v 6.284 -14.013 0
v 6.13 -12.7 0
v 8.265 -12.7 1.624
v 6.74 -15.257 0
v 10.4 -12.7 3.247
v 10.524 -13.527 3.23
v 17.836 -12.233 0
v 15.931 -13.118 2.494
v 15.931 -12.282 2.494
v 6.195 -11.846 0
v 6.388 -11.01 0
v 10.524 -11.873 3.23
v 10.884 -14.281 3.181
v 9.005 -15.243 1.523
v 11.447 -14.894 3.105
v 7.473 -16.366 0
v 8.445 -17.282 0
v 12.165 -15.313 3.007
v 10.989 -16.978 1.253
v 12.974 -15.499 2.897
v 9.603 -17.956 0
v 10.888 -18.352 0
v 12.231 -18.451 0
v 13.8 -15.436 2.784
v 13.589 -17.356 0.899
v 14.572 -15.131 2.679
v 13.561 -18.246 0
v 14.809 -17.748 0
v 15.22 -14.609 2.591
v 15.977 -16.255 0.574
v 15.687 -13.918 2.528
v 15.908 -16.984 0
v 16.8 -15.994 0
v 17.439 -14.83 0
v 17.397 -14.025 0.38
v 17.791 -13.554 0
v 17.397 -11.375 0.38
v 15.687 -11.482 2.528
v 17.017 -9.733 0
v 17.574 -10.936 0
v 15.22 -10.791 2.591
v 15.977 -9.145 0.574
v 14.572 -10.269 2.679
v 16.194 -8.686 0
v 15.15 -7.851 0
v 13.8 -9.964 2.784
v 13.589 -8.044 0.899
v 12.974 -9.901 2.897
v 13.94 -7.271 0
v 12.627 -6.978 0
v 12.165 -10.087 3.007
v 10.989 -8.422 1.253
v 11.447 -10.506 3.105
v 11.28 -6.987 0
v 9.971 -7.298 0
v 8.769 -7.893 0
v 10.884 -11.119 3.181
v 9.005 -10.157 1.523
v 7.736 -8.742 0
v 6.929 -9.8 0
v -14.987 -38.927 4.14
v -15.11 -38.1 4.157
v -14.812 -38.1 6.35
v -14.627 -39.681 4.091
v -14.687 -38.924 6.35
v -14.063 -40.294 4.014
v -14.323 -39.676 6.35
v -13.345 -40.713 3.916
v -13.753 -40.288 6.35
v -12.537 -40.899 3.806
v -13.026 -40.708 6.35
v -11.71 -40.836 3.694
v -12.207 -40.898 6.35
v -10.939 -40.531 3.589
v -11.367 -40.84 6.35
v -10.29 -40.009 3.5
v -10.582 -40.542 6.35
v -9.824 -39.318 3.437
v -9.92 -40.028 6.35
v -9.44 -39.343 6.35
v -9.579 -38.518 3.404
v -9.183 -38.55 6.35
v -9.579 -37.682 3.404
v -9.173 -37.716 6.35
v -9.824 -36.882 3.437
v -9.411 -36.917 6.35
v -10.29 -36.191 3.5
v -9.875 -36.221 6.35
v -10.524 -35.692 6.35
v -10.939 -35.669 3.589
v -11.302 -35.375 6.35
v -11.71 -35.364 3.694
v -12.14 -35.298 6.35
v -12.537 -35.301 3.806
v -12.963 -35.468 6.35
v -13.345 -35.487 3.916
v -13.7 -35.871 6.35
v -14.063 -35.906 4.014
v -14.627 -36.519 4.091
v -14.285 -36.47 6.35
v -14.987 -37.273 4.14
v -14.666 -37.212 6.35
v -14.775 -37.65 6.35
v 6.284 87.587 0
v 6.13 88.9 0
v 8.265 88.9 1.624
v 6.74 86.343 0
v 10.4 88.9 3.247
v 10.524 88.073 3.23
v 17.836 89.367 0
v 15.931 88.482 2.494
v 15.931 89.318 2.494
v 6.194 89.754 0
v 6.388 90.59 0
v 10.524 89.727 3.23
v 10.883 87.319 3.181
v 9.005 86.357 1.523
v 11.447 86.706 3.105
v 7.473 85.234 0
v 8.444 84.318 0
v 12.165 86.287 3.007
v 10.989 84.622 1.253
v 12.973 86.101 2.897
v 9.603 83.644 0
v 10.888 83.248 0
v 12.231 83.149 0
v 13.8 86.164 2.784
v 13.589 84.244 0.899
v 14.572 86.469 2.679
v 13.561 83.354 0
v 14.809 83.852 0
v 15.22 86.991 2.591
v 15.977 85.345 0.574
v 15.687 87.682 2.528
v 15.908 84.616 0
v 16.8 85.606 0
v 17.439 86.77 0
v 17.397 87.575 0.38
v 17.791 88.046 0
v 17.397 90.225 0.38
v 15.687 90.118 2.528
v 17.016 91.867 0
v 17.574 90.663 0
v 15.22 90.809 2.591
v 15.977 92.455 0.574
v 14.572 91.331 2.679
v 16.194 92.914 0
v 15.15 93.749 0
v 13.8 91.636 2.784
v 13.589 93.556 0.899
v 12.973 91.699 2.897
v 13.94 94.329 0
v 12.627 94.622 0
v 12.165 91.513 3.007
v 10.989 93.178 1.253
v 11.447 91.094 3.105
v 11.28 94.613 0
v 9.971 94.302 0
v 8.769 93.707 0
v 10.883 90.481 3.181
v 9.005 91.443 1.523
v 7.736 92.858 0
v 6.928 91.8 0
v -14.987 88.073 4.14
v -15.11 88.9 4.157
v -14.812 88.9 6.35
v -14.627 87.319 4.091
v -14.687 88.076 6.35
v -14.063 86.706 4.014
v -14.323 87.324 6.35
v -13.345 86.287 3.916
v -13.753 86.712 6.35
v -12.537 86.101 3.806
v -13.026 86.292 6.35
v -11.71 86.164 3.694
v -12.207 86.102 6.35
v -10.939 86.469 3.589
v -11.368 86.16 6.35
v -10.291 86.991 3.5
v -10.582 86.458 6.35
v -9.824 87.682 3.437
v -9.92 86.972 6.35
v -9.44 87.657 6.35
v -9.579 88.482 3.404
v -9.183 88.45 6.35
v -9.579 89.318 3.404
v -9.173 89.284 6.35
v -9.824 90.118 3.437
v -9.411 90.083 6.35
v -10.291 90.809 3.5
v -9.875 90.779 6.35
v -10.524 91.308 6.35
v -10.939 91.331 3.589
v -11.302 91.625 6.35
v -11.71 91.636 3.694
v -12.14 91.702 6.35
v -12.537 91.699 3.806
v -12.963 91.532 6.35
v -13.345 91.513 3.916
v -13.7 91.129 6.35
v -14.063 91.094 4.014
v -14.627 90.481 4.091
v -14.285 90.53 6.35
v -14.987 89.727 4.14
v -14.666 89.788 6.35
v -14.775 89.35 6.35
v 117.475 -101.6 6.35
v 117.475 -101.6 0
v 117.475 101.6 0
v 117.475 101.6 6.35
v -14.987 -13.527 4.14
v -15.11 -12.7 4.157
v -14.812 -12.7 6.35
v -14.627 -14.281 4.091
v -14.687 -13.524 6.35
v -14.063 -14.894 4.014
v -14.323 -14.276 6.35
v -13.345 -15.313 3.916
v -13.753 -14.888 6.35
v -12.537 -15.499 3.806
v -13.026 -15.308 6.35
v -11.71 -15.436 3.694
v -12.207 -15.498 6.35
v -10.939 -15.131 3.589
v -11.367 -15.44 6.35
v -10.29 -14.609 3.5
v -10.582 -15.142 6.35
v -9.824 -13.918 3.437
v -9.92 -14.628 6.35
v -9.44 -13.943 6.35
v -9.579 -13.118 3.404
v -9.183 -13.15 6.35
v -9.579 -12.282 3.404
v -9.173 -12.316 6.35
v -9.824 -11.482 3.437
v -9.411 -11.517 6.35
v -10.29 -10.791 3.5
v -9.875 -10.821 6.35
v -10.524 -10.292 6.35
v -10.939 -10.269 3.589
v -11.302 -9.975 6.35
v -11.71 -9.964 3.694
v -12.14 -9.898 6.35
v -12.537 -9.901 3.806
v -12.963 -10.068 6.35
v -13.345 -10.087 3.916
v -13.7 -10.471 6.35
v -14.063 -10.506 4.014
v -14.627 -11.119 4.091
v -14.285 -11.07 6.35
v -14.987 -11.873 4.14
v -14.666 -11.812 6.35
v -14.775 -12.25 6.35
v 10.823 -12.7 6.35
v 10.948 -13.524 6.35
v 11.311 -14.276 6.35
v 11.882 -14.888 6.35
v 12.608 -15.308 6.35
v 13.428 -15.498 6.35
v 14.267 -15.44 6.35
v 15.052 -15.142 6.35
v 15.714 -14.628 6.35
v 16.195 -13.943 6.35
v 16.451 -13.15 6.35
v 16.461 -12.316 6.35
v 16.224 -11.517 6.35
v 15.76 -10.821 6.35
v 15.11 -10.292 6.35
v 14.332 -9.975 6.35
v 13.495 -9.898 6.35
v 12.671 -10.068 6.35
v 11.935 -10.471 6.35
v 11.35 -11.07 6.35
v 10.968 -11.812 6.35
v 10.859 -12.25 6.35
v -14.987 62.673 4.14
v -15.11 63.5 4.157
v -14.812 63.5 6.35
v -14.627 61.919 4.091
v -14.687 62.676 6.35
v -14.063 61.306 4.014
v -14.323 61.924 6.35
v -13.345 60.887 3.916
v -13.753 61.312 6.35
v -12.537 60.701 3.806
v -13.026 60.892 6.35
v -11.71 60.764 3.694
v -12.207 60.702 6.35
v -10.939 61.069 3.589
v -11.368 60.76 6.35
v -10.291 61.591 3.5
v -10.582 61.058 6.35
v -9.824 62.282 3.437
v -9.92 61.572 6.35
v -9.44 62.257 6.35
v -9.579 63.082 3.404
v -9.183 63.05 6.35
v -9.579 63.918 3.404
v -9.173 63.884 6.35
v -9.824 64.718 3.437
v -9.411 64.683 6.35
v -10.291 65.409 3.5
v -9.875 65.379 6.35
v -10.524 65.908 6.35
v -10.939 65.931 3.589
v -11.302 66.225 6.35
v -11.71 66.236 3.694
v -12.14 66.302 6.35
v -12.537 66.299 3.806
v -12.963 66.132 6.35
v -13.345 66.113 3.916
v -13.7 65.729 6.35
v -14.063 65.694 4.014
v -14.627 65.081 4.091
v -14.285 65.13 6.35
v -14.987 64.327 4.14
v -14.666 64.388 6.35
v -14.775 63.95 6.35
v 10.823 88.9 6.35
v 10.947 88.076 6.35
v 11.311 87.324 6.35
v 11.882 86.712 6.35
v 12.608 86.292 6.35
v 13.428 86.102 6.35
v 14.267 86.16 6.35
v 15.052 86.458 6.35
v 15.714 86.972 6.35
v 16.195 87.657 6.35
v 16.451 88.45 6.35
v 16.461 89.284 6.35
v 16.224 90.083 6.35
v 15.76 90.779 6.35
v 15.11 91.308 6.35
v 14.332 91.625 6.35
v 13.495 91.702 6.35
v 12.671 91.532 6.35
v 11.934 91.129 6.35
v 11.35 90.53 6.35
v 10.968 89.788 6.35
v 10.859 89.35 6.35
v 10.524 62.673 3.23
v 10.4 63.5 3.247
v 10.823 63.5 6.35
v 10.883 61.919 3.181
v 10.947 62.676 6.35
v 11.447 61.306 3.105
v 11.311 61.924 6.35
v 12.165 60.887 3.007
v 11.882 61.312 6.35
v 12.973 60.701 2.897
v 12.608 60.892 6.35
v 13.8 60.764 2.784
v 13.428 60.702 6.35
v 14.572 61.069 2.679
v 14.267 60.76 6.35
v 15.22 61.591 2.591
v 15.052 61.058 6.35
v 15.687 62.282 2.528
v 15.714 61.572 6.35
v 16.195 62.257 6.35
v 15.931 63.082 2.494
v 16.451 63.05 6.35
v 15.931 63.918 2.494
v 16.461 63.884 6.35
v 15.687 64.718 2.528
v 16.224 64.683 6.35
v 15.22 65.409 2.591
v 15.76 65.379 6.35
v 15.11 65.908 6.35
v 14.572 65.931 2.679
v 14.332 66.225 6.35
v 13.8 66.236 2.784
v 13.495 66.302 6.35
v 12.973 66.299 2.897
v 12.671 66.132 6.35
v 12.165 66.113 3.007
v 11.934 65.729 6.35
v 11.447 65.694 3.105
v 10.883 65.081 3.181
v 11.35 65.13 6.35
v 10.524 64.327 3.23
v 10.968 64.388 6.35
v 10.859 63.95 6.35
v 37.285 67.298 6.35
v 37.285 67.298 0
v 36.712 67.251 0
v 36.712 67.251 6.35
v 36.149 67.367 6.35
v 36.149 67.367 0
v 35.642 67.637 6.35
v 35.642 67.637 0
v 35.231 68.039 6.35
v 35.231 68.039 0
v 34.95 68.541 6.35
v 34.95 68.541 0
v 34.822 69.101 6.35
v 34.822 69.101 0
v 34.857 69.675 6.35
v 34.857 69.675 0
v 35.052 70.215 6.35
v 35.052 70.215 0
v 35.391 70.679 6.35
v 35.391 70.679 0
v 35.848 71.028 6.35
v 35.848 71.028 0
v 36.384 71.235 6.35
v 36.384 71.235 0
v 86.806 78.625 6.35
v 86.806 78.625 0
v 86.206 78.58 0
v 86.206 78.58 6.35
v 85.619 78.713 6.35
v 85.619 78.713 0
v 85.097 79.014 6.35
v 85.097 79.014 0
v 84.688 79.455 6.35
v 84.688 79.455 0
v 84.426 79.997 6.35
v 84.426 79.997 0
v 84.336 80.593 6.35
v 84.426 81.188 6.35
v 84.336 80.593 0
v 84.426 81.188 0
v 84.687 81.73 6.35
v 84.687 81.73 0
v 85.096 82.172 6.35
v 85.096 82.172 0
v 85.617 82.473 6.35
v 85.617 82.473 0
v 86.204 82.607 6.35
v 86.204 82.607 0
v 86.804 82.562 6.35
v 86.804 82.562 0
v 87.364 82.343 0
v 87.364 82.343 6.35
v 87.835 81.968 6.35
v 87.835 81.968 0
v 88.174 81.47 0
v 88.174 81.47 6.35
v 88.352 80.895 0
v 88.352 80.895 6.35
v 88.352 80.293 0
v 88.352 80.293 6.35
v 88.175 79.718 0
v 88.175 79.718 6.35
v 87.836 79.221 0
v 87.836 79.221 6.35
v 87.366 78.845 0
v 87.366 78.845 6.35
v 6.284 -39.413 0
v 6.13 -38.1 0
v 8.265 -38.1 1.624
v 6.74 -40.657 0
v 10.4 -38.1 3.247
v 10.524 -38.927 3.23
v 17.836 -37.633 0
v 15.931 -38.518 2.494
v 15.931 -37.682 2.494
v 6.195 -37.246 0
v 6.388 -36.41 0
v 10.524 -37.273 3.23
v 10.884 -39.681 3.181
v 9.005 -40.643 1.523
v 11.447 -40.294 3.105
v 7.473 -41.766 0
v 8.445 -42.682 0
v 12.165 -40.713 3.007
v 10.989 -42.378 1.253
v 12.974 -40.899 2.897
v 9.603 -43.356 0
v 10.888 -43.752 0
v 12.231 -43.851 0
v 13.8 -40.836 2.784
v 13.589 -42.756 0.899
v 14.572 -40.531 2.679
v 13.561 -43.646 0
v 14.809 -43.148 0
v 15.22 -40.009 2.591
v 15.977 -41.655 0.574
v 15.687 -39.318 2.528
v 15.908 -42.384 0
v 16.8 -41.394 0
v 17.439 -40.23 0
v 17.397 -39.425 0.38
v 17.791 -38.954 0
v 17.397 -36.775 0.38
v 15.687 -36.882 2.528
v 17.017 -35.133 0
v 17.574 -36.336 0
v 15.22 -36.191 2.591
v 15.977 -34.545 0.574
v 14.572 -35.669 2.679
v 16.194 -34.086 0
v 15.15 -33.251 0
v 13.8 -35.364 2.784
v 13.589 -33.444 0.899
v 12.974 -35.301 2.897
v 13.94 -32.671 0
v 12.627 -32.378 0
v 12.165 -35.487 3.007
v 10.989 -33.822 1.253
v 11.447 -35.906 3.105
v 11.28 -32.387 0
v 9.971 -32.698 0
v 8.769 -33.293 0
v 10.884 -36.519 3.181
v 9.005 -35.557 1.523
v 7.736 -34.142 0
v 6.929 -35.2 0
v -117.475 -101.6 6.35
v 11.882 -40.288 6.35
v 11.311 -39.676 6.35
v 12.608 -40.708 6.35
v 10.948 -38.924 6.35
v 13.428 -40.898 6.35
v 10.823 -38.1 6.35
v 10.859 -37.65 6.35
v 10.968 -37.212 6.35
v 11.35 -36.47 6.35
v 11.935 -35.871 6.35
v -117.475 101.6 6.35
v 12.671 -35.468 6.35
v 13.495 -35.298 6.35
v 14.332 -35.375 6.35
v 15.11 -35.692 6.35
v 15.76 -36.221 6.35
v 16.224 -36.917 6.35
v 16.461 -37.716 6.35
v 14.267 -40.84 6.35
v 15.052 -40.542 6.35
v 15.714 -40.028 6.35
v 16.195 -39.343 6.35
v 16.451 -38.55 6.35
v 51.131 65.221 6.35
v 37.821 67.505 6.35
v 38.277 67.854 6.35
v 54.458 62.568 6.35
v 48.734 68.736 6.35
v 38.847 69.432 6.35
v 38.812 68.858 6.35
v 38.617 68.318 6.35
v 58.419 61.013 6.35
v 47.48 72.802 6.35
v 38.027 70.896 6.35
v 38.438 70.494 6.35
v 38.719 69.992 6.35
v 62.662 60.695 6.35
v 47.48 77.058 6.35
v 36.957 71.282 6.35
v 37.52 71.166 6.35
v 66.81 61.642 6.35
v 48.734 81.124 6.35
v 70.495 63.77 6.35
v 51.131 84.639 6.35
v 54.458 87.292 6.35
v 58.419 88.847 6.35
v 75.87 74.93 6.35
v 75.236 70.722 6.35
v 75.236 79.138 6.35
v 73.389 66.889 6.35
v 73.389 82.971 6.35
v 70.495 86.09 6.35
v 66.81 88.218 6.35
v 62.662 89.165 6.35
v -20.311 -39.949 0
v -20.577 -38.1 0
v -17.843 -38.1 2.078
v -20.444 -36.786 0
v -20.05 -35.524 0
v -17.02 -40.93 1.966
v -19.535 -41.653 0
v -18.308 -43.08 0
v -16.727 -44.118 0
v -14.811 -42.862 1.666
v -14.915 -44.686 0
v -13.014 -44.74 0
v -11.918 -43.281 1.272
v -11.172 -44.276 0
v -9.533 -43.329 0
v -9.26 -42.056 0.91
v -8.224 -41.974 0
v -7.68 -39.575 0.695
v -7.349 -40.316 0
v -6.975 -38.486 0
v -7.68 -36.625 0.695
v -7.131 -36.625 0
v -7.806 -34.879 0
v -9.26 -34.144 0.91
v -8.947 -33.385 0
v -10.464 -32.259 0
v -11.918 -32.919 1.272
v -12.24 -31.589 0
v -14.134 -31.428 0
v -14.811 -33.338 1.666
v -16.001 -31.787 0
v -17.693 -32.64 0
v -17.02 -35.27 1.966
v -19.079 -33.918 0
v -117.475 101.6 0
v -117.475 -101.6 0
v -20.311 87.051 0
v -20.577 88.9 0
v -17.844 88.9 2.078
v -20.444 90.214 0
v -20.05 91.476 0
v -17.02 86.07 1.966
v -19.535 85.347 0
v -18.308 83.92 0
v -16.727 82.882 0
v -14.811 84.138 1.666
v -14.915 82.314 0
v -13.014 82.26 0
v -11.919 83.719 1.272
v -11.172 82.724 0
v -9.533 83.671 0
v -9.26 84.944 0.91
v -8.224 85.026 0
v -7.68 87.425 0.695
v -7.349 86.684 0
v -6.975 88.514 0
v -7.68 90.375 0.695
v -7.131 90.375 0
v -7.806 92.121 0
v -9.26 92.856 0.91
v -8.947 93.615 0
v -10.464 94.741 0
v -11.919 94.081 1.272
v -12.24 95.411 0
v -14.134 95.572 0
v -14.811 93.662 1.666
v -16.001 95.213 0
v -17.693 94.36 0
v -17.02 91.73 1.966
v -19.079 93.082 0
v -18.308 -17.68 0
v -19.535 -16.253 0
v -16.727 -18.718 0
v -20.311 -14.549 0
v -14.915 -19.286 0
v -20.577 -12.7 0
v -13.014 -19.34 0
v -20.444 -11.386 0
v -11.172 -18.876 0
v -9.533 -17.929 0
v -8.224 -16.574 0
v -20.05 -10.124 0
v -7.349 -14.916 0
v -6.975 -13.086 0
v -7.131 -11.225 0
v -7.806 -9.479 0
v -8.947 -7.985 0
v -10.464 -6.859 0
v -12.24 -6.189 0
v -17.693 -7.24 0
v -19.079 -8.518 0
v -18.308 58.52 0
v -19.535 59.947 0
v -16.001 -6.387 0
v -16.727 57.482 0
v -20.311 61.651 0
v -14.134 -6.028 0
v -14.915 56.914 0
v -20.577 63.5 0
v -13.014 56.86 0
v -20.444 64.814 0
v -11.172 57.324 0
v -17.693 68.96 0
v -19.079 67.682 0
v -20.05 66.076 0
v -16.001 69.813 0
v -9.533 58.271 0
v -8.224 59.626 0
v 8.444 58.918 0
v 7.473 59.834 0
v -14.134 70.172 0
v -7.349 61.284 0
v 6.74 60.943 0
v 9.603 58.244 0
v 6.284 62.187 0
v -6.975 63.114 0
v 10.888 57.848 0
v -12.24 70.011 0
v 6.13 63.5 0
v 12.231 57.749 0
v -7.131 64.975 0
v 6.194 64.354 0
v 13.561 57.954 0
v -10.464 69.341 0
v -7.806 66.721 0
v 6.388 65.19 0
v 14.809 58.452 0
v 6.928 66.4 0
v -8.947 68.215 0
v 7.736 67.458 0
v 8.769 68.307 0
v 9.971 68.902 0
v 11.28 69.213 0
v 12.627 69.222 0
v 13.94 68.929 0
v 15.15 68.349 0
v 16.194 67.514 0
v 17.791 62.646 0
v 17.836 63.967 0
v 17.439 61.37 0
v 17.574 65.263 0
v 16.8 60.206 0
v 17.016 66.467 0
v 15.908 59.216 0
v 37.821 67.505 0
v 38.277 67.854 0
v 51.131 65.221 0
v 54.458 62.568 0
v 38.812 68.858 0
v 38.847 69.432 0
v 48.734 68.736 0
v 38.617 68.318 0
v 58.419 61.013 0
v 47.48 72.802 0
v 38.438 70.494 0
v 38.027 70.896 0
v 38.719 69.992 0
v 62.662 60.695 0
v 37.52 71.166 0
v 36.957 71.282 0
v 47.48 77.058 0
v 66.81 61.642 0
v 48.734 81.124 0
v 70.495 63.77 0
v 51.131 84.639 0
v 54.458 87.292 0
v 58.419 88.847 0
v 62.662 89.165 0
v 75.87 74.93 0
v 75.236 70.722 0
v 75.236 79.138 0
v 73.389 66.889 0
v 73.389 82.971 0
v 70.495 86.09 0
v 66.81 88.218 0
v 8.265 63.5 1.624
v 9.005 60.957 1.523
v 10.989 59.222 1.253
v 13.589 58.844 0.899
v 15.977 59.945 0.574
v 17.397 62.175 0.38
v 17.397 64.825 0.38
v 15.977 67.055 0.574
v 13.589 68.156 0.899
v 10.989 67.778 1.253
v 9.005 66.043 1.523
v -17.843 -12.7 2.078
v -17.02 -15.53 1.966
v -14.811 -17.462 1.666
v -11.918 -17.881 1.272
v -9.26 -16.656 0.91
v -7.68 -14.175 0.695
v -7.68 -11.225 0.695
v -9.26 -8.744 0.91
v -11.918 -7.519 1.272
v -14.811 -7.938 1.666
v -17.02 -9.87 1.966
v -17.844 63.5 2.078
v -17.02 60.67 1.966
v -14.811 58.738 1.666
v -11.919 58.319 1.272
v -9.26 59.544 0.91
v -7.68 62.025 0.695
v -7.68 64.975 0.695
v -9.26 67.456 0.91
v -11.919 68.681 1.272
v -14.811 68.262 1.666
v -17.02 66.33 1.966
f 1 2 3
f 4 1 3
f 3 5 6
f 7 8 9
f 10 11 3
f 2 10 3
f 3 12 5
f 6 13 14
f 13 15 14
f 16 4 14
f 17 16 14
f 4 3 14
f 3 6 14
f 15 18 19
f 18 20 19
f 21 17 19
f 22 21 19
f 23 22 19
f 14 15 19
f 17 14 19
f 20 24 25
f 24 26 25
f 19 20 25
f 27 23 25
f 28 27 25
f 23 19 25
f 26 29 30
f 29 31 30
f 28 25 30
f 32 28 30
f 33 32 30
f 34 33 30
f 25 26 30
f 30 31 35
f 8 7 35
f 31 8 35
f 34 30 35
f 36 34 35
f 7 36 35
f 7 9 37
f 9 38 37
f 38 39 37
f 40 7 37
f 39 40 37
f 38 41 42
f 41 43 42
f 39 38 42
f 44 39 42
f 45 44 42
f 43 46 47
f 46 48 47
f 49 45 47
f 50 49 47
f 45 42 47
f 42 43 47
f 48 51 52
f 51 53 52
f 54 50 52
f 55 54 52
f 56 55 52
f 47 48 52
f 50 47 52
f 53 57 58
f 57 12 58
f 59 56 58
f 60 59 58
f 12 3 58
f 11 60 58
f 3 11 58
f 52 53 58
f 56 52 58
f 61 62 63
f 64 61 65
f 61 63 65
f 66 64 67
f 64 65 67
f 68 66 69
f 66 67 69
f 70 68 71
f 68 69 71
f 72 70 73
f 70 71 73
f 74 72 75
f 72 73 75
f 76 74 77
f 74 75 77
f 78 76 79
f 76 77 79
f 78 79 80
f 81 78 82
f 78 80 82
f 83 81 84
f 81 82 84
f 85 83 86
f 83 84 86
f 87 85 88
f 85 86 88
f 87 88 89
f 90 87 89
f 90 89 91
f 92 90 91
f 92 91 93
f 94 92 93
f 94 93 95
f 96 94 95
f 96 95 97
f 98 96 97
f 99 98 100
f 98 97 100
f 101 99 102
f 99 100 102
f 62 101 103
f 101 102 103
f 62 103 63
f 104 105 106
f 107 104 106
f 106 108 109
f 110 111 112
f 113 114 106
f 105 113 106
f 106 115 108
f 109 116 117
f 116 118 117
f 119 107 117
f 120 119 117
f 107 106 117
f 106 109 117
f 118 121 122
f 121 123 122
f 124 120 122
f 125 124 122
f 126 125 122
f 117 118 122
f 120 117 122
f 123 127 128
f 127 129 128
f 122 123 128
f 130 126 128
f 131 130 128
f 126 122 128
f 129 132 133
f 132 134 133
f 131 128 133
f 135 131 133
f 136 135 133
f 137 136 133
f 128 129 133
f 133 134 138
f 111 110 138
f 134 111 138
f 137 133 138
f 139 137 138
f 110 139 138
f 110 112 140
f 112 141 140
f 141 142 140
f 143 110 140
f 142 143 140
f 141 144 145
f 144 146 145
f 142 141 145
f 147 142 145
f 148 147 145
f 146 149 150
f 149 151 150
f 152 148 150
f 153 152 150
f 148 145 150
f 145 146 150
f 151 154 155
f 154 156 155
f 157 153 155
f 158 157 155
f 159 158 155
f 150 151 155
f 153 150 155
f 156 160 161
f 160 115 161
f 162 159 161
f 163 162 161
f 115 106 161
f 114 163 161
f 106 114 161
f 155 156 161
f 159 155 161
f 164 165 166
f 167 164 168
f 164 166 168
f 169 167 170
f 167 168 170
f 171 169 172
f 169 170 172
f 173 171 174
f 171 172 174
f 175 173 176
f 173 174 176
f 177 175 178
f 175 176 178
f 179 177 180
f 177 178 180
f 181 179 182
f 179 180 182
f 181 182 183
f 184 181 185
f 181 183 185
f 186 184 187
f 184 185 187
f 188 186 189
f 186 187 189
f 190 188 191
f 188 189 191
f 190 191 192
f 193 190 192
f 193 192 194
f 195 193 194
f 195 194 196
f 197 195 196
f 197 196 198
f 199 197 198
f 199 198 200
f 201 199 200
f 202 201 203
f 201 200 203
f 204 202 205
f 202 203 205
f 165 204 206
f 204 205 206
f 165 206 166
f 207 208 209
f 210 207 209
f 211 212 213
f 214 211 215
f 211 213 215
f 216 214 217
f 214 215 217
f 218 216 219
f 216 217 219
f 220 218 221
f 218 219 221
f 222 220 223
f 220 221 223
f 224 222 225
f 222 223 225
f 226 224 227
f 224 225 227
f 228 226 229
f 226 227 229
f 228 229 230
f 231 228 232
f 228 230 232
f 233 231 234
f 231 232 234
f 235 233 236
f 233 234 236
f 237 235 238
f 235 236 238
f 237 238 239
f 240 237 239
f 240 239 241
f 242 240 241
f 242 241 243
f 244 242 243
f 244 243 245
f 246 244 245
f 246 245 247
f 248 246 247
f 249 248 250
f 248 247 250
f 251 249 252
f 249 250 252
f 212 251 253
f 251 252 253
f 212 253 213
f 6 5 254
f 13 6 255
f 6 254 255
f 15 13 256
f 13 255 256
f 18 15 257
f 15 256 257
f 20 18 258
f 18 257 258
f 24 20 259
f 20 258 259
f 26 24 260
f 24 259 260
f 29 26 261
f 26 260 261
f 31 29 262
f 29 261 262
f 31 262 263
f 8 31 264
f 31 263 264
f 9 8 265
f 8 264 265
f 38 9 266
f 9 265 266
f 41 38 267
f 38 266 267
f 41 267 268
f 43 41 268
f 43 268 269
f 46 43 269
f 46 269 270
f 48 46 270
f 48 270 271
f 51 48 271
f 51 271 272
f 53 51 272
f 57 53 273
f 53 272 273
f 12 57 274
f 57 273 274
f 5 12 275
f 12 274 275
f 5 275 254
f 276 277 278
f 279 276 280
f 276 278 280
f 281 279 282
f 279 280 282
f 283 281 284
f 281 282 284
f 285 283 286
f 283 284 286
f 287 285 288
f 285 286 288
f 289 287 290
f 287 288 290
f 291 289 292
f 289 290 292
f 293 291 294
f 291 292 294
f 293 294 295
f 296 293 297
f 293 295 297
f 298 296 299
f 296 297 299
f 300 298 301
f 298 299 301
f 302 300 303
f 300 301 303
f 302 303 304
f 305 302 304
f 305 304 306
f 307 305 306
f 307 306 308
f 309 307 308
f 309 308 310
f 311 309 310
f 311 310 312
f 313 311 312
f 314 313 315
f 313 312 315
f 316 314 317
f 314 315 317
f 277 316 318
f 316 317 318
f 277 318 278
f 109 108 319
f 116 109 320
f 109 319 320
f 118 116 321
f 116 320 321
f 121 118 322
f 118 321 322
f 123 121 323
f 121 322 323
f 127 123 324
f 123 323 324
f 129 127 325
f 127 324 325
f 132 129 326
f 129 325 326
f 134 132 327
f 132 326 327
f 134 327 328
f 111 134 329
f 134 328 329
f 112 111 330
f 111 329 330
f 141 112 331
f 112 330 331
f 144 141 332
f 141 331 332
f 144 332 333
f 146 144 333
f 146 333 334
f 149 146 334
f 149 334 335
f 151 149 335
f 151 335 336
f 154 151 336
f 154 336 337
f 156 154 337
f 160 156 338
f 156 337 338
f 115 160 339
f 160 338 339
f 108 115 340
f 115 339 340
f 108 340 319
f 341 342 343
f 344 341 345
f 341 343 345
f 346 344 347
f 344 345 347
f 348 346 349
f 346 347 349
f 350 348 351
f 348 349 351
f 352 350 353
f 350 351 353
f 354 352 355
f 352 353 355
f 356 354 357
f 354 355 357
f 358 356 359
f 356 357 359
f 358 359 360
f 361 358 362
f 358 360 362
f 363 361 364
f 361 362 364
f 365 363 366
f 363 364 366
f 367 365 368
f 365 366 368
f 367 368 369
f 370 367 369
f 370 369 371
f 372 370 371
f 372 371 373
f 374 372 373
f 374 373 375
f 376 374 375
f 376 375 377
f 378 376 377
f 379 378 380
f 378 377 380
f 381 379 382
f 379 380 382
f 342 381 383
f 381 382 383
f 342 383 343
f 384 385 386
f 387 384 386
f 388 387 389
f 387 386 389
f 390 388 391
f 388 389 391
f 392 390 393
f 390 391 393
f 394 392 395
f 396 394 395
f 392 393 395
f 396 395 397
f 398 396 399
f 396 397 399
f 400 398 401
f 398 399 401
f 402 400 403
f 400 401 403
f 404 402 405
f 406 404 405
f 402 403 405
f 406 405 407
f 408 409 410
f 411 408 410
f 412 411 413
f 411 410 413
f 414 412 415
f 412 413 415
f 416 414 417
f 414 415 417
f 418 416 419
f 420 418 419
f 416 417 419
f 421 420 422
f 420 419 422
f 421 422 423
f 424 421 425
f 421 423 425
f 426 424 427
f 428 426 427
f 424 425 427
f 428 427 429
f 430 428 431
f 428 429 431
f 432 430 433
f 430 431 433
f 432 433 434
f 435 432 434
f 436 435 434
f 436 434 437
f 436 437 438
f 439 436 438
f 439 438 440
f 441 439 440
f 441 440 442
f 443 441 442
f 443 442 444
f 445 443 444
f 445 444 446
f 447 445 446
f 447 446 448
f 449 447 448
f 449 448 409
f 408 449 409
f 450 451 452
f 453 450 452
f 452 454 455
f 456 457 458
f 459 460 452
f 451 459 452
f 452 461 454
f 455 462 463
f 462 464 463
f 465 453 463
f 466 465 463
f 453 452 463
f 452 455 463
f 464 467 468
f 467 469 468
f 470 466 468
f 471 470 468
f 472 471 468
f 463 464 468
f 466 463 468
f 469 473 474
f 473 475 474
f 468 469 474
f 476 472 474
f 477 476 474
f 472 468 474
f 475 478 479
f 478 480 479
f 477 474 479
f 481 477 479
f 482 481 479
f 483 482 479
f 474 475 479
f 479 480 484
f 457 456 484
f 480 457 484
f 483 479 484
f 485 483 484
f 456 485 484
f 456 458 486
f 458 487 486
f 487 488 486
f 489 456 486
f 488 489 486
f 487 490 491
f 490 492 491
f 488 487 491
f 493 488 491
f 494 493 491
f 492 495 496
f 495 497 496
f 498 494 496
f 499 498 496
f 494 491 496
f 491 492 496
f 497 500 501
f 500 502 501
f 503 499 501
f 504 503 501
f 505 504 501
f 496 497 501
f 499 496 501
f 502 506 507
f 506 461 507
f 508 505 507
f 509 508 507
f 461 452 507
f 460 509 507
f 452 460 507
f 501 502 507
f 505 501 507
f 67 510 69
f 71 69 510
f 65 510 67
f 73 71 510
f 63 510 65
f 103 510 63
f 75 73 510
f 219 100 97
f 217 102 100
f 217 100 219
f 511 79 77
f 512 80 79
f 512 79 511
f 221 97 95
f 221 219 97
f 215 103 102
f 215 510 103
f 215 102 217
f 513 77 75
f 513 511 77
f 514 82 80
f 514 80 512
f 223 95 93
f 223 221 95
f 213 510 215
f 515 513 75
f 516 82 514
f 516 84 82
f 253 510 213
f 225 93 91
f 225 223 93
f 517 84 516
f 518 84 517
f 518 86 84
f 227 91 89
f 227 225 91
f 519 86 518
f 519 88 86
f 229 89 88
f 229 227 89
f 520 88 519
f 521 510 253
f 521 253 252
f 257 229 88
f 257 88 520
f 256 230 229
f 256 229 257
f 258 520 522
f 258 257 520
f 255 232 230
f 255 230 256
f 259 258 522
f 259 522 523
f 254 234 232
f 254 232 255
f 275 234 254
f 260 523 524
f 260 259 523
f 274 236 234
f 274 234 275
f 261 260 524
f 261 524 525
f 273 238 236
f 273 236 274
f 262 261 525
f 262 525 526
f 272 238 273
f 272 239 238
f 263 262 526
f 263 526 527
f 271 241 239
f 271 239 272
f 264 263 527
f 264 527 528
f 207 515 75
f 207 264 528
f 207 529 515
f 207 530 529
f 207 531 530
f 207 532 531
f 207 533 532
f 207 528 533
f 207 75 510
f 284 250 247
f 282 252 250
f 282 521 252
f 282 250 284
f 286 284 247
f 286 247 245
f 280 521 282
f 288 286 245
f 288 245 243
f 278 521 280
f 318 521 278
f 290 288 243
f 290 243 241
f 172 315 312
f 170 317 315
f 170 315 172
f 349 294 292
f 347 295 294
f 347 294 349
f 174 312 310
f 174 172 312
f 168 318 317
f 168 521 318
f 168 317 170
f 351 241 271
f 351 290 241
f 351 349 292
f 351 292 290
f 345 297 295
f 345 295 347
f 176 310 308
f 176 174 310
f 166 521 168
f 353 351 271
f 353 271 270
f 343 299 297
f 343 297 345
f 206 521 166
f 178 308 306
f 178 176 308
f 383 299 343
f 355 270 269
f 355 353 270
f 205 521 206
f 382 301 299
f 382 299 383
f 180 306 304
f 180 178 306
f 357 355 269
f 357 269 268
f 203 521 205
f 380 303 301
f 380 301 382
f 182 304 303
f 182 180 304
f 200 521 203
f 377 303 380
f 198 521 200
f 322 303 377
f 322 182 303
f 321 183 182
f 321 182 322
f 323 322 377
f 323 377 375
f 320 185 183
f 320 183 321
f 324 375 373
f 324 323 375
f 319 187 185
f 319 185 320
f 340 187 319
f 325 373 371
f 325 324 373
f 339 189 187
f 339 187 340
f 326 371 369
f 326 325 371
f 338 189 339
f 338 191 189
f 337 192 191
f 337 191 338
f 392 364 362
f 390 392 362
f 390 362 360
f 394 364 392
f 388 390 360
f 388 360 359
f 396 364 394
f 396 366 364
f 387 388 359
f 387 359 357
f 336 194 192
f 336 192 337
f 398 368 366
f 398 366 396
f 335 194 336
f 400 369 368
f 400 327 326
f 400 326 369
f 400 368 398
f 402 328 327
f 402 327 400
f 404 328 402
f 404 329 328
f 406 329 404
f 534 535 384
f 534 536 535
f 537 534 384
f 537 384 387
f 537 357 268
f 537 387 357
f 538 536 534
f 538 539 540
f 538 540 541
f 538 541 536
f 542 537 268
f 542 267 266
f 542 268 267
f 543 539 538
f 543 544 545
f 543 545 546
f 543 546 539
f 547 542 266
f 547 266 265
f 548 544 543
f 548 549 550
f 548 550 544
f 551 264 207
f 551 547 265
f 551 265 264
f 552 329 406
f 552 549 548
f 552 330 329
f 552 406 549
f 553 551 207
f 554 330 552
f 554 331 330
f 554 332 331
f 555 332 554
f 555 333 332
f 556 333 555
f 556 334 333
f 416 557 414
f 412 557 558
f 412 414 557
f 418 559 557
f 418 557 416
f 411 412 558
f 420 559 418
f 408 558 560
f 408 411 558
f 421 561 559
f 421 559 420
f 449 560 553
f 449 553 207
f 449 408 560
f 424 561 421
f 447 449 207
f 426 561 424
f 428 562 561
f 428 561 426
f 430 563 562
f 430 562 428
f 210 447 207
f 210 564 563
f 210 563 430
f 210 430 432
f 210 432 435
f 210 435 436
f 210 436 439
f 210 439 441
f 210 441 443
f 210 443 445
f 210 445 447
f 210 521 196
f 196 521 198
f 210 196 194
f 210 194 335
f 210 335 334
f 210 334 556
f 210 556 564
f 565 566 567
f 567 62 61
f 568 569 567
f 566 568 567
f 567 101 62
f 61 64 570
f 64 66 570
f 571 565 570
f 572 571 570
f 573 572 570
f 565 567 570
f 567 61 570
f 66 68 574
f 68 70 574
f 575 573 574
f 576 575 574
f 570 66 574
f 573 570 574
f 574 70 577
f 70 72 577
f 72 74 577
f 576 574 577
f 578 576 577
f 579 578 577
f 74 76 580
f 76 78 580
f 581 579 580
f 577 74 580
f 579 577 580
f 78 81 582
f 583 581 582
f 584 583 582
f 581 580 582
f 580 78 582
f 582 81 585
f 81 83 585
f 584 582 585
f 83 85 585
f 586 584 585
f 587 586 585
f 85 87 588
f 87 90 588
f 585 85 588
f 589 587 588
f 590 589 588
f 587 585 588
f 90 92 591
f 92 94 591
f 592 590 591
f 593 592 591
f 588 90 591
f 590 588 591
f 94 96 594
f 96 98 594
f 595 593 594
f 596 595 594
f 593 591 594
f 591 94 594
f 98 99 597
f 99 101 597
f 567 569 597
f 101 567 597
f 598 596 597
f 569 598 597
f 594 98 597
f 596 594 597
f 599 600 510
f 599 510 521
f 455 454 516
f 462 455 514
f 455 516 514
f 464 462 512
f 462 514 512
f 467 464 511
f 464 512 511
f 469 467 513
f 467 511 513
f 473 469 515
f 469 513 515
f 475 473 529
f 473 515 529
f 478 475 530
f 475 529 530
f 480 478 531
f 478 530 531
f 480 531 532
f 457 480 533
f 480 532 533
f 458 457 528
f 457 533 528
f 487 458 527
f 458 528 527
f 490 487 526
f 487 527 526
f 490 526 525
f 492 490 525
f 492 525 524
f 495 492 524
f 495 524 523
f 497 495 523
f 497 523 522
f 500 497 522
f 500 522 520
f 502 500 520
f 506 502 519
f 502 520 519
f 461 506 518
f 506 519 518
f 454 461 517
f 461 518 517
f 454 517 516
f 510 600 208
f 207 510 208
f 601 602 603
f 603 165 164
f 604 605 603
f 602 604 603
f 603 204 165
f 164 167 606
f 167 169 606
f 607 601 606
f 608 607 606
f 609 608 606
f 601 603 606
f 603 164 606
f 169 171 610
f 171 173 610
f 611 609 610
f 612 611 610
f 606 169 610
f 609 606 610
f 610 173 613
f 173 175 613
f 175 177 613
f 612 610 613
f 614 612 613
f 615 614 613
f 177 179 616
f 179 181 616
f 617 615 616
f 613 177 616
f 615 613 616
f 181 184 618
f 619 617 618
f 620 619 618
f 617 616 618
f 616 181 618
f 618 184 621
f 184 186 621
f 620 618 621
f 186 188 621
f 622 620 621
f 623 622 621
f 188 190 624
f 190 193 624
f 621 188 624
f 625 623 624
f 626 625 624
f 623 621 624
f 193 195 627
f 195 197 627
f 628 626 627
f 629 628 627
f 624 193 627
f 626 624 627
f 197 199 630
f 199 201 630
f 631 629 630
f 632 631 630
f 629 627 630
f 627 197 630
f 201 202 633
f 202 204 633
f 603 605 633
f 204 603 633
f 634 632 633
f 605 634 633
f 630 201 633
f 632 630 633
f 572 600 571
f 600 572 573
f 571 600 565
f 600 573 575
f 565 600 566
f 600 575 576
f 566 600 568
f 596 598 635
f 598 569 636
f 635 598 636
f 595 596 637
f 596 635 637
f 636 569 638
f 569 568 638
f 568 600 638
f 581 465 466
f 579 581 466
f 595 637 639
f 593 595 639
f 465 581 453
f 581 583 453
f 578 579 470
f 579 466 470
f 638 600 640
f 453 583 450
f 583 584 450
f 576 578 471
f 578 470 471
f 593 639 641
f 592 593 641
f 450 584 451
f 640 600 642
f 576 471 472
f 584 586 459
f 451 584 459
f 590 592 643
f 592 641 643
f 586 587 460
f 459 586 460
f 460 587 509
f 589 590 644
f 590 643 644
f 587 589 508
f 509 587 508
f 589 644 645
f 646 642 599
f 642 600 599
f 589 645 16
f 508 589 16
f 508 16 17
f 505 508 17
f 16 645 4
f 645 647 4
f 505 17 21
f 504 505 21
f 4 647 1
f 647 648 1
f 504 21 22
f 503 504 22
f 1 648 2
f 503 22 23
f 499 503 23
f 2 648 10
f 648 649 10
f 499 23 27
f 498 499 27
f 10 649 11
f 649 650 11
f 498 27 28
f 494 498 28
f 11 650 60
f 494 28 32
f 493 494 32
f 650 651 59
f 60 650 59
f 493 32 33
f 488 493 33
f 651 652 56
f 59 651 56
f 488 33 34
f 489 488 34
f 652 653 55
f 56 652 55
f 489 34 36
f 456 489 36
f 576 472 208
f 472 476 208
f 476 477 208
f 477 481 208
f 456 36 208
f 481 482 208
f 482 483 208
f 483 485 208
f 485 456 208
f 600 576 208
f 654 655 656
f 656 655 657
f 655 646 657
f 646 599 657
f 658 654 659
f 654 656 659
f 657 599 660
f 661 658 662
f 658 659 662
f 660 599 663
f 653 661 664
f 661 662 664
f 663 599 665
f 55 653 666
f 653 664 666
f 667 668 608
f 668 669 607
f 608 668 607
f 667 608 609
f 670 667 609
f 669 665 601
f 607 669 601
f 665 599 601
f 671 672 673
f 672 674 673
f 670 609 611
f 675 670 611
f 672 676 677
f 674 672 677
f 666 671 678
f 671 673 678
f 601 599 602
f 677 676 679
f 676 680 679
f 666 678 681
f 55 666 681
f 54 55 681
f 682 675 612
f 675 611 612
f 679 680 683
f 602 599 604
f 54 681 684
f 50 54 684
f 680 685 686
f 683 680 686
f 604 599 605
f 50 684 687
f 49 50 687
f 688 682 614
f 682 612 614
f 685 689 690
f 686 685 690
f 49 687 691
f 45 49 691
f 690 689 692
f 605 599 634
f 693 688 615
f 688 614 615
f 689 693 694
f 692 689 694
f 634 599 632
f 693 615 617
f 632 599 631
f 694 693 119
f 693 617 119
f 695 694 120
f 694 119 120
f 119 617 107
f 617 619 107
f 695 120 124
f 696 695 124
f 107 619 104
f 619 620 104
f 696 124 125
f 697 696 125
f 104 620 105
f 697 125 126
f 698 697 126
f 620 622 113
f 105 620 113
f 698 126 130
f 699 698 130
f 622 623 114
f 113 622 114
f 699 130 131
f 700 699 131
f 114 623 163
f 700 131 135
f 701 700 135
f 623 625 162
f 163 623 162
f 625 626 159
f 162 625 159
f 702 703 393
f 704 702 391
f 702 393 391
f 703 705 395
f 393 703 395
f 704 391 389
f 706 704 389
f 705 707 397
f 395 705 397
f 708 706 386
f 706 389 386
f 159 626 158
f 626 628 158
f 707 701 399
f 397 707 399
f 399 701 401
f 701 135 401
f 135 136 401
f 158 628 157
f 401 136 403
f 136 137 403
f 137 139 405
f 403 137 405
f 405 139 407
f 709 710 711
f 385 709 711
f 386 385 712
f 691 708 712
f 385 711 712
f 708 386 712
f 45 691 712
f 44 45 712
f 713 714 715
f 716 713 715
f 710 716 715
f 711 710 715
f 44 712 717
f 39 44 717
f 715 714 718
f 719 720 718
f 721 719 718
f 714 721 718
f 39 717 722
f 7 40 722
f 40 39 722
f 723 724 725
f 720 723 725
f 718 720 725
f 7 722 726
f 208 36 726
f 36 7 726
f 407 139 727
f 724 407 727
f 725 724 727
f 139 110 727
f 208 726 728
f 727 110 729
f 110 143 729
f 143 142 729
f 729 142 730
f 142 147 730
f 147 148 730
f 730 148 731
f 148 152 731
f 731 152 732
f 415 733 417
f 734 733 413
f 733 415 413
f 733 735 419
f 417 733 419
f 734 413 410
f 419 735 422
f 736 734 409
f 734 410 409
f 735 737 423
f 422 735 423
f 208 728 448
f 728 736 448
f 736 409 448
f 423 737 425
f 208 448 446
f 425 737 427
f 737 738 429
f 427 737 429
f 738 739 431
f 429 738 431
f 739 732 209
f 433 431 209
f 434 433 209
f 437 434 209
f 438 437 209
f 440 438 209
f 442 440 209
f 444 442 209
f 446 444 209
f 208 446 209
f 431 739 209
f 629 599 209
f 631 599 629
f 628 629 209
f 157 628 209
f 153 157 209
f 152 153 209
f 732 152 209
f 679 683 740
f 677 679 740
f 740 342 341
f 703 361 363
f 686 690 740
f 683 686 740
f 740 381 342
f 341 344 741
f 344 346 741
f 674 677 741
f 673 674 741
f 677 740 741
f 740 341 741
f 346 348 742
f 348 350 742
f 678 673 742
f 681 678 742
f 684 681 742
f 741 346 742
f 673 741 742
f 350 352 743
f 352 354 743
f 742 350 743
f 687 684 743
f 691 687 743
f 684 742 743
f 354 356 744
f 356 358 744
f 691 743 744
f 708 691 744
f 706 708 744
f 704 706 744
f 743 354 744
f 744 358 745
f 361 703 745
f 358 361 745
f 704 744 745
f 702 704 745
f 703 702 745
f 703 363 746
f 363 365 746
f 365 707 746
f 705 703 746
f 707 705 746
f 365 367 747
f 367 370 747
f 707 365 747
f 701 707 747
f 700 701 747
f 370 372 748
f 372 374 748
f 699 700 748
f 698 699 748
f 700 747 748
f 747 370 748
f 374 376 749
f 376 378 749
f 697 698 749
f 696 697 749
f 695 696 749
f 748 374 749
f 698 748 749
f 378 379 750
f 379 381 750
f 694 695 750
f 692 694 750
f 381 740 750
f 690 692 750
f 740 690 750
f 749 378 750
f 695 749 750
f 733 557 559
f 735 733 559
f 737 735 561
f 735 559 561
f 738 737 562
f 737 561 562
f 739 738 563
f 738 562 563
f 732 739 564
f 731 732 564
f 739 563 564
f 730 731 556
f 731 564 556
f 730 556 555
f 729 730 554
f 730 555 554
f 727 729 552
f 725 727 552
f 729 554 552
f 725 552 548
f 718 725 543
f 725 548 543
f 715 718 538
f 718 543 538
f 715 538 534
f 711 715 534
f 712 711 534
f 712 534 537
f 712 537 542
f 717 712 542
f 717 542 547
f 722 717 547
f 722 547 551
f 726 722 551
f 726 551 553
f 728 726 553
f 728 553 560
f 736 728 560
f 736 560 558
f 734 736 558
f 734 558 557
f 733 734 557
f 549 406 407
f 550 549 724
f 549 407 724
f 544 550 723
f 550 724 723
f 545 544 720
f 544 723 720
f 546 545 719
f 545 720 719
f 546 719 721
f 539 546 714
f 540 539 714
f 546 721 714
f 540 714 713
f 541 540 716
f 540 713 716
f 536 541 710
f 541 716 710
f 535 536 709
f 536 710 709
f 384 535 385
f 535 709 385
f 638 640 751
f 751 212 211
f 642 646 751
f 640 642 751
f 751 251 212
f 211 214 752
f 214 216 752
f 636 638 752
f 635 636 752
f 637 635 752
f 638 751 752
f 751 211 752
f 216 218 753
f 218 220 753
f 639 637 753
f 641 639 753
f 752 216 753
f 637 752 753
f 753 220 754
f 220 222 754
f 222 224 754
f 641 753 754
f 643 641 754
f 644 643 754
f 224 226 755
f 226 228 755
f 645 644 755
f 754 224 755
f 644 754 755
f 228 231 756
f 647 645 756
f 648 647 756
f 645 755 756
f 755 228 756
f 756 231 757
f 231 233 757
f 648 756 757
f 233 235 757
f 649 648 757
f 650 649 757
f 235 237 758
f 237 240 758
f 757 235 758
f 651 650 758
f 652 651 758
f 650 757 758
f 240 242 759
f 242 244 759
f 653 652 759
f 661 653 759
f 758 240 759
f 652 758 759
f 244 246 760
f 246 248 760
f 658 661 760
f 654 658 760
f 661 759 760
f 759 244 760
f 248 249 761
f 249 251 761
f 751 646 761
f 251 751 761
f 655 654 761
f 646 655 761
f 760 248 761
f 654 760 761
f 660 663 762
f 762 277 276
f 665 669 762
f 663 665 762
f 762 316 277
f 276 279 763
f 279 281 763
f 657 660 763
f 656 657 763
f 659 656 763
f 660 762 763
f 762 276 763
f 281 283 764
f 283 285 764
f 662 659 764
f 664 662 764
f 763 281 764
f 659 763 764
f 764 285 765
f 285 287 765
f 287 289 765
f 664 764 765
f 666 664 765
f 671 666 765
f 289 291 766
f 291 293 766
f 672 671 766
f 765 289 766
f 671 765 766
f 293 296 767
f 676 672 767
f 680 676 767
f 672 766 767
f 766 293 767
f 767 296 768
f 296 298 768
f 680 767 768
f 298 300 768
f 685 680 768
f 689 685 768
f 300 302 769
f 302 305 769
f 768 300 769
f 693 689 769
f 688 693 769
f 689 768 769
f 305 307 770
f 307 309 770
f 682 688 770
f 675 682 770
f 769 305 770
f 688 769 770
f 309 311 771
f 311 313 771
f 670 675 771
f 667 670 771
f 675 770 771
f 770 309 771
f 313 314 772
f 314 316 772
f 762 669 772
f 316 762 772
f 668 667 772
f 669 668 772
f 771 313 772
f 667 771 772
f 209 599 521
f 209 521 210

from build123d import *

# Parameters (mm, degrees)
SKETCH1_W                                          = 234.95
SKETCH1_H                                          = 203.2
BOSS_EXTRUDE1_DEPTH                                = 6.35
SKETCH2_R                                          = 14.2748
CUT_EXTRUDE1_DEPTH                                 = 7.35
CSK_FOR_10_FLAT_HEAD_MACHINE_SCREW_100_D           = 5.6134
CSK_FOR_10_FLAT_HEAD_MACHINE_SCREW_100_CSINK_D     = 17.78
CSK_FOR_10_FLAT_HEAD_MACHINE_SCREW_100_CSINK_ANGLE = 90
CSK_FOR_10_FLAT_HEAD_MACHINE_SCREW_2_D             = 5.6134
CSK_FOR_10_FLAT_HEAD_MACHINE_SCREW_2_CSINK_D       = 17.78
CSK_FOR_10_FLAT_HEAD_MACHINE_SCREW_2_CSINK_ANGLE   = 90
CUT_EXTRUDE2_DEPTH                                 = 7.35


with BuildPart() as part:
    # Sketch1 → Boss-Extrude1 (new body)
    with BuildSketch(Plane.XY):
        Rectangle(SKETCH1_W, SKETCH1_H)
    extrude(amount=BOSS_EXTRUDE1_DEPTH)

    # Sketch2 → Cut-Extrude1 (cut, through all)
    with BuildSketch(Plane.XY.offset(6.35)):
        with Locations((61.595, 74.93)):
            Circle(SKETCH2_R)
    extrude(amount=-CUT_EXTRUDE1_DEPTH, mode=Mode.SUBTRACT)

    # CSK for _10 Flat Head Machine Screw _100 (through all)
    with Locations(Plane(origin=(292.076985897, -265.595089466, -43.80037576), x_dir=(0.990861087, 0, -0.134886274), z_dir=(-0.134886274, 0, -0.990861087))):
        with Locations((-308.041854919, -227.495089466), (-308.041854919, -252.895089466), (-308.041972913, -329.095089466), (-308.041972913, -354.495089466)):
            CounterSinkHole(CSK_FOR_10_FLAT_HEAD_MACHINE_SCREW_100_D / 2, CSK_FOR_10_FLAT_HEAD_MACHINE_SCREW_100_CSINK_D / 2, counter_sink_angle=CSK_FOR_10_FLAT_HEAD_MACHINE_SCREW_100_CSINK_ANGLE)

    # CSK for _10 Flat Head Machine Screw  2 (through all)
    with Locations(Plane(origin=(292.419597033, -265.595089466, -41.283588599), x_dir=(0.990861087, 0, -0.134886274), z_dir=(-0.134886274, 0, -0.990861087))):
        with Locations((-282.641854919, -227.495089466), (-282.641854919, -252.895089466), (-282.641972913, -329.095089466), (-282.641972913, -354.495089466)):
            CounterSinkHole(CSK_FOR_10_FLAT_HEAD_MACHINE_SCREW_2_D / 2, CSK_FOR_10_FLAT_HEAD_MACHINE_SCREW_2_CSINK_D / 2, counter_sink_angle=CSK_FOR_10_FLAT_HEAD_MACHINE_SCREW_2_CSINK_ANGLE)

    # Sketch10 → Cut-Extrude2 (cut, through all)
    with BuildSketch(Plane(origin=(0, 0, 0), x_dir=(-1, 0, 0), z_dir=(0, 0, -1))):
        with BuildLine():
            ThreePointArc((-85.905304985, 82.561948902), (-88.324015931, 81.043732073), (-86.805799102, 78.625021127))
            ThreePointArc((-86.805799102, 78.625021127), (-84.387088156, 80.143237956), (-85.905304985, 82.561948902))
        make_face()
        with BuildLine():
            ThreePointArc((-36.384200898, 71.234978873), (-38.802911844, 69.716762044), (-37.284695016, 67.298051098))
            ThreePointArc((-37.284695016, 67.298051098), (-34.86598407, 68.816267927), (-36.384200898, 71.234978873))
        make_face()
    extrude(amount=-CUT_EXTRUDE2_DEPTH, mode=Mode.SUBTRACT)


solid = part.part
